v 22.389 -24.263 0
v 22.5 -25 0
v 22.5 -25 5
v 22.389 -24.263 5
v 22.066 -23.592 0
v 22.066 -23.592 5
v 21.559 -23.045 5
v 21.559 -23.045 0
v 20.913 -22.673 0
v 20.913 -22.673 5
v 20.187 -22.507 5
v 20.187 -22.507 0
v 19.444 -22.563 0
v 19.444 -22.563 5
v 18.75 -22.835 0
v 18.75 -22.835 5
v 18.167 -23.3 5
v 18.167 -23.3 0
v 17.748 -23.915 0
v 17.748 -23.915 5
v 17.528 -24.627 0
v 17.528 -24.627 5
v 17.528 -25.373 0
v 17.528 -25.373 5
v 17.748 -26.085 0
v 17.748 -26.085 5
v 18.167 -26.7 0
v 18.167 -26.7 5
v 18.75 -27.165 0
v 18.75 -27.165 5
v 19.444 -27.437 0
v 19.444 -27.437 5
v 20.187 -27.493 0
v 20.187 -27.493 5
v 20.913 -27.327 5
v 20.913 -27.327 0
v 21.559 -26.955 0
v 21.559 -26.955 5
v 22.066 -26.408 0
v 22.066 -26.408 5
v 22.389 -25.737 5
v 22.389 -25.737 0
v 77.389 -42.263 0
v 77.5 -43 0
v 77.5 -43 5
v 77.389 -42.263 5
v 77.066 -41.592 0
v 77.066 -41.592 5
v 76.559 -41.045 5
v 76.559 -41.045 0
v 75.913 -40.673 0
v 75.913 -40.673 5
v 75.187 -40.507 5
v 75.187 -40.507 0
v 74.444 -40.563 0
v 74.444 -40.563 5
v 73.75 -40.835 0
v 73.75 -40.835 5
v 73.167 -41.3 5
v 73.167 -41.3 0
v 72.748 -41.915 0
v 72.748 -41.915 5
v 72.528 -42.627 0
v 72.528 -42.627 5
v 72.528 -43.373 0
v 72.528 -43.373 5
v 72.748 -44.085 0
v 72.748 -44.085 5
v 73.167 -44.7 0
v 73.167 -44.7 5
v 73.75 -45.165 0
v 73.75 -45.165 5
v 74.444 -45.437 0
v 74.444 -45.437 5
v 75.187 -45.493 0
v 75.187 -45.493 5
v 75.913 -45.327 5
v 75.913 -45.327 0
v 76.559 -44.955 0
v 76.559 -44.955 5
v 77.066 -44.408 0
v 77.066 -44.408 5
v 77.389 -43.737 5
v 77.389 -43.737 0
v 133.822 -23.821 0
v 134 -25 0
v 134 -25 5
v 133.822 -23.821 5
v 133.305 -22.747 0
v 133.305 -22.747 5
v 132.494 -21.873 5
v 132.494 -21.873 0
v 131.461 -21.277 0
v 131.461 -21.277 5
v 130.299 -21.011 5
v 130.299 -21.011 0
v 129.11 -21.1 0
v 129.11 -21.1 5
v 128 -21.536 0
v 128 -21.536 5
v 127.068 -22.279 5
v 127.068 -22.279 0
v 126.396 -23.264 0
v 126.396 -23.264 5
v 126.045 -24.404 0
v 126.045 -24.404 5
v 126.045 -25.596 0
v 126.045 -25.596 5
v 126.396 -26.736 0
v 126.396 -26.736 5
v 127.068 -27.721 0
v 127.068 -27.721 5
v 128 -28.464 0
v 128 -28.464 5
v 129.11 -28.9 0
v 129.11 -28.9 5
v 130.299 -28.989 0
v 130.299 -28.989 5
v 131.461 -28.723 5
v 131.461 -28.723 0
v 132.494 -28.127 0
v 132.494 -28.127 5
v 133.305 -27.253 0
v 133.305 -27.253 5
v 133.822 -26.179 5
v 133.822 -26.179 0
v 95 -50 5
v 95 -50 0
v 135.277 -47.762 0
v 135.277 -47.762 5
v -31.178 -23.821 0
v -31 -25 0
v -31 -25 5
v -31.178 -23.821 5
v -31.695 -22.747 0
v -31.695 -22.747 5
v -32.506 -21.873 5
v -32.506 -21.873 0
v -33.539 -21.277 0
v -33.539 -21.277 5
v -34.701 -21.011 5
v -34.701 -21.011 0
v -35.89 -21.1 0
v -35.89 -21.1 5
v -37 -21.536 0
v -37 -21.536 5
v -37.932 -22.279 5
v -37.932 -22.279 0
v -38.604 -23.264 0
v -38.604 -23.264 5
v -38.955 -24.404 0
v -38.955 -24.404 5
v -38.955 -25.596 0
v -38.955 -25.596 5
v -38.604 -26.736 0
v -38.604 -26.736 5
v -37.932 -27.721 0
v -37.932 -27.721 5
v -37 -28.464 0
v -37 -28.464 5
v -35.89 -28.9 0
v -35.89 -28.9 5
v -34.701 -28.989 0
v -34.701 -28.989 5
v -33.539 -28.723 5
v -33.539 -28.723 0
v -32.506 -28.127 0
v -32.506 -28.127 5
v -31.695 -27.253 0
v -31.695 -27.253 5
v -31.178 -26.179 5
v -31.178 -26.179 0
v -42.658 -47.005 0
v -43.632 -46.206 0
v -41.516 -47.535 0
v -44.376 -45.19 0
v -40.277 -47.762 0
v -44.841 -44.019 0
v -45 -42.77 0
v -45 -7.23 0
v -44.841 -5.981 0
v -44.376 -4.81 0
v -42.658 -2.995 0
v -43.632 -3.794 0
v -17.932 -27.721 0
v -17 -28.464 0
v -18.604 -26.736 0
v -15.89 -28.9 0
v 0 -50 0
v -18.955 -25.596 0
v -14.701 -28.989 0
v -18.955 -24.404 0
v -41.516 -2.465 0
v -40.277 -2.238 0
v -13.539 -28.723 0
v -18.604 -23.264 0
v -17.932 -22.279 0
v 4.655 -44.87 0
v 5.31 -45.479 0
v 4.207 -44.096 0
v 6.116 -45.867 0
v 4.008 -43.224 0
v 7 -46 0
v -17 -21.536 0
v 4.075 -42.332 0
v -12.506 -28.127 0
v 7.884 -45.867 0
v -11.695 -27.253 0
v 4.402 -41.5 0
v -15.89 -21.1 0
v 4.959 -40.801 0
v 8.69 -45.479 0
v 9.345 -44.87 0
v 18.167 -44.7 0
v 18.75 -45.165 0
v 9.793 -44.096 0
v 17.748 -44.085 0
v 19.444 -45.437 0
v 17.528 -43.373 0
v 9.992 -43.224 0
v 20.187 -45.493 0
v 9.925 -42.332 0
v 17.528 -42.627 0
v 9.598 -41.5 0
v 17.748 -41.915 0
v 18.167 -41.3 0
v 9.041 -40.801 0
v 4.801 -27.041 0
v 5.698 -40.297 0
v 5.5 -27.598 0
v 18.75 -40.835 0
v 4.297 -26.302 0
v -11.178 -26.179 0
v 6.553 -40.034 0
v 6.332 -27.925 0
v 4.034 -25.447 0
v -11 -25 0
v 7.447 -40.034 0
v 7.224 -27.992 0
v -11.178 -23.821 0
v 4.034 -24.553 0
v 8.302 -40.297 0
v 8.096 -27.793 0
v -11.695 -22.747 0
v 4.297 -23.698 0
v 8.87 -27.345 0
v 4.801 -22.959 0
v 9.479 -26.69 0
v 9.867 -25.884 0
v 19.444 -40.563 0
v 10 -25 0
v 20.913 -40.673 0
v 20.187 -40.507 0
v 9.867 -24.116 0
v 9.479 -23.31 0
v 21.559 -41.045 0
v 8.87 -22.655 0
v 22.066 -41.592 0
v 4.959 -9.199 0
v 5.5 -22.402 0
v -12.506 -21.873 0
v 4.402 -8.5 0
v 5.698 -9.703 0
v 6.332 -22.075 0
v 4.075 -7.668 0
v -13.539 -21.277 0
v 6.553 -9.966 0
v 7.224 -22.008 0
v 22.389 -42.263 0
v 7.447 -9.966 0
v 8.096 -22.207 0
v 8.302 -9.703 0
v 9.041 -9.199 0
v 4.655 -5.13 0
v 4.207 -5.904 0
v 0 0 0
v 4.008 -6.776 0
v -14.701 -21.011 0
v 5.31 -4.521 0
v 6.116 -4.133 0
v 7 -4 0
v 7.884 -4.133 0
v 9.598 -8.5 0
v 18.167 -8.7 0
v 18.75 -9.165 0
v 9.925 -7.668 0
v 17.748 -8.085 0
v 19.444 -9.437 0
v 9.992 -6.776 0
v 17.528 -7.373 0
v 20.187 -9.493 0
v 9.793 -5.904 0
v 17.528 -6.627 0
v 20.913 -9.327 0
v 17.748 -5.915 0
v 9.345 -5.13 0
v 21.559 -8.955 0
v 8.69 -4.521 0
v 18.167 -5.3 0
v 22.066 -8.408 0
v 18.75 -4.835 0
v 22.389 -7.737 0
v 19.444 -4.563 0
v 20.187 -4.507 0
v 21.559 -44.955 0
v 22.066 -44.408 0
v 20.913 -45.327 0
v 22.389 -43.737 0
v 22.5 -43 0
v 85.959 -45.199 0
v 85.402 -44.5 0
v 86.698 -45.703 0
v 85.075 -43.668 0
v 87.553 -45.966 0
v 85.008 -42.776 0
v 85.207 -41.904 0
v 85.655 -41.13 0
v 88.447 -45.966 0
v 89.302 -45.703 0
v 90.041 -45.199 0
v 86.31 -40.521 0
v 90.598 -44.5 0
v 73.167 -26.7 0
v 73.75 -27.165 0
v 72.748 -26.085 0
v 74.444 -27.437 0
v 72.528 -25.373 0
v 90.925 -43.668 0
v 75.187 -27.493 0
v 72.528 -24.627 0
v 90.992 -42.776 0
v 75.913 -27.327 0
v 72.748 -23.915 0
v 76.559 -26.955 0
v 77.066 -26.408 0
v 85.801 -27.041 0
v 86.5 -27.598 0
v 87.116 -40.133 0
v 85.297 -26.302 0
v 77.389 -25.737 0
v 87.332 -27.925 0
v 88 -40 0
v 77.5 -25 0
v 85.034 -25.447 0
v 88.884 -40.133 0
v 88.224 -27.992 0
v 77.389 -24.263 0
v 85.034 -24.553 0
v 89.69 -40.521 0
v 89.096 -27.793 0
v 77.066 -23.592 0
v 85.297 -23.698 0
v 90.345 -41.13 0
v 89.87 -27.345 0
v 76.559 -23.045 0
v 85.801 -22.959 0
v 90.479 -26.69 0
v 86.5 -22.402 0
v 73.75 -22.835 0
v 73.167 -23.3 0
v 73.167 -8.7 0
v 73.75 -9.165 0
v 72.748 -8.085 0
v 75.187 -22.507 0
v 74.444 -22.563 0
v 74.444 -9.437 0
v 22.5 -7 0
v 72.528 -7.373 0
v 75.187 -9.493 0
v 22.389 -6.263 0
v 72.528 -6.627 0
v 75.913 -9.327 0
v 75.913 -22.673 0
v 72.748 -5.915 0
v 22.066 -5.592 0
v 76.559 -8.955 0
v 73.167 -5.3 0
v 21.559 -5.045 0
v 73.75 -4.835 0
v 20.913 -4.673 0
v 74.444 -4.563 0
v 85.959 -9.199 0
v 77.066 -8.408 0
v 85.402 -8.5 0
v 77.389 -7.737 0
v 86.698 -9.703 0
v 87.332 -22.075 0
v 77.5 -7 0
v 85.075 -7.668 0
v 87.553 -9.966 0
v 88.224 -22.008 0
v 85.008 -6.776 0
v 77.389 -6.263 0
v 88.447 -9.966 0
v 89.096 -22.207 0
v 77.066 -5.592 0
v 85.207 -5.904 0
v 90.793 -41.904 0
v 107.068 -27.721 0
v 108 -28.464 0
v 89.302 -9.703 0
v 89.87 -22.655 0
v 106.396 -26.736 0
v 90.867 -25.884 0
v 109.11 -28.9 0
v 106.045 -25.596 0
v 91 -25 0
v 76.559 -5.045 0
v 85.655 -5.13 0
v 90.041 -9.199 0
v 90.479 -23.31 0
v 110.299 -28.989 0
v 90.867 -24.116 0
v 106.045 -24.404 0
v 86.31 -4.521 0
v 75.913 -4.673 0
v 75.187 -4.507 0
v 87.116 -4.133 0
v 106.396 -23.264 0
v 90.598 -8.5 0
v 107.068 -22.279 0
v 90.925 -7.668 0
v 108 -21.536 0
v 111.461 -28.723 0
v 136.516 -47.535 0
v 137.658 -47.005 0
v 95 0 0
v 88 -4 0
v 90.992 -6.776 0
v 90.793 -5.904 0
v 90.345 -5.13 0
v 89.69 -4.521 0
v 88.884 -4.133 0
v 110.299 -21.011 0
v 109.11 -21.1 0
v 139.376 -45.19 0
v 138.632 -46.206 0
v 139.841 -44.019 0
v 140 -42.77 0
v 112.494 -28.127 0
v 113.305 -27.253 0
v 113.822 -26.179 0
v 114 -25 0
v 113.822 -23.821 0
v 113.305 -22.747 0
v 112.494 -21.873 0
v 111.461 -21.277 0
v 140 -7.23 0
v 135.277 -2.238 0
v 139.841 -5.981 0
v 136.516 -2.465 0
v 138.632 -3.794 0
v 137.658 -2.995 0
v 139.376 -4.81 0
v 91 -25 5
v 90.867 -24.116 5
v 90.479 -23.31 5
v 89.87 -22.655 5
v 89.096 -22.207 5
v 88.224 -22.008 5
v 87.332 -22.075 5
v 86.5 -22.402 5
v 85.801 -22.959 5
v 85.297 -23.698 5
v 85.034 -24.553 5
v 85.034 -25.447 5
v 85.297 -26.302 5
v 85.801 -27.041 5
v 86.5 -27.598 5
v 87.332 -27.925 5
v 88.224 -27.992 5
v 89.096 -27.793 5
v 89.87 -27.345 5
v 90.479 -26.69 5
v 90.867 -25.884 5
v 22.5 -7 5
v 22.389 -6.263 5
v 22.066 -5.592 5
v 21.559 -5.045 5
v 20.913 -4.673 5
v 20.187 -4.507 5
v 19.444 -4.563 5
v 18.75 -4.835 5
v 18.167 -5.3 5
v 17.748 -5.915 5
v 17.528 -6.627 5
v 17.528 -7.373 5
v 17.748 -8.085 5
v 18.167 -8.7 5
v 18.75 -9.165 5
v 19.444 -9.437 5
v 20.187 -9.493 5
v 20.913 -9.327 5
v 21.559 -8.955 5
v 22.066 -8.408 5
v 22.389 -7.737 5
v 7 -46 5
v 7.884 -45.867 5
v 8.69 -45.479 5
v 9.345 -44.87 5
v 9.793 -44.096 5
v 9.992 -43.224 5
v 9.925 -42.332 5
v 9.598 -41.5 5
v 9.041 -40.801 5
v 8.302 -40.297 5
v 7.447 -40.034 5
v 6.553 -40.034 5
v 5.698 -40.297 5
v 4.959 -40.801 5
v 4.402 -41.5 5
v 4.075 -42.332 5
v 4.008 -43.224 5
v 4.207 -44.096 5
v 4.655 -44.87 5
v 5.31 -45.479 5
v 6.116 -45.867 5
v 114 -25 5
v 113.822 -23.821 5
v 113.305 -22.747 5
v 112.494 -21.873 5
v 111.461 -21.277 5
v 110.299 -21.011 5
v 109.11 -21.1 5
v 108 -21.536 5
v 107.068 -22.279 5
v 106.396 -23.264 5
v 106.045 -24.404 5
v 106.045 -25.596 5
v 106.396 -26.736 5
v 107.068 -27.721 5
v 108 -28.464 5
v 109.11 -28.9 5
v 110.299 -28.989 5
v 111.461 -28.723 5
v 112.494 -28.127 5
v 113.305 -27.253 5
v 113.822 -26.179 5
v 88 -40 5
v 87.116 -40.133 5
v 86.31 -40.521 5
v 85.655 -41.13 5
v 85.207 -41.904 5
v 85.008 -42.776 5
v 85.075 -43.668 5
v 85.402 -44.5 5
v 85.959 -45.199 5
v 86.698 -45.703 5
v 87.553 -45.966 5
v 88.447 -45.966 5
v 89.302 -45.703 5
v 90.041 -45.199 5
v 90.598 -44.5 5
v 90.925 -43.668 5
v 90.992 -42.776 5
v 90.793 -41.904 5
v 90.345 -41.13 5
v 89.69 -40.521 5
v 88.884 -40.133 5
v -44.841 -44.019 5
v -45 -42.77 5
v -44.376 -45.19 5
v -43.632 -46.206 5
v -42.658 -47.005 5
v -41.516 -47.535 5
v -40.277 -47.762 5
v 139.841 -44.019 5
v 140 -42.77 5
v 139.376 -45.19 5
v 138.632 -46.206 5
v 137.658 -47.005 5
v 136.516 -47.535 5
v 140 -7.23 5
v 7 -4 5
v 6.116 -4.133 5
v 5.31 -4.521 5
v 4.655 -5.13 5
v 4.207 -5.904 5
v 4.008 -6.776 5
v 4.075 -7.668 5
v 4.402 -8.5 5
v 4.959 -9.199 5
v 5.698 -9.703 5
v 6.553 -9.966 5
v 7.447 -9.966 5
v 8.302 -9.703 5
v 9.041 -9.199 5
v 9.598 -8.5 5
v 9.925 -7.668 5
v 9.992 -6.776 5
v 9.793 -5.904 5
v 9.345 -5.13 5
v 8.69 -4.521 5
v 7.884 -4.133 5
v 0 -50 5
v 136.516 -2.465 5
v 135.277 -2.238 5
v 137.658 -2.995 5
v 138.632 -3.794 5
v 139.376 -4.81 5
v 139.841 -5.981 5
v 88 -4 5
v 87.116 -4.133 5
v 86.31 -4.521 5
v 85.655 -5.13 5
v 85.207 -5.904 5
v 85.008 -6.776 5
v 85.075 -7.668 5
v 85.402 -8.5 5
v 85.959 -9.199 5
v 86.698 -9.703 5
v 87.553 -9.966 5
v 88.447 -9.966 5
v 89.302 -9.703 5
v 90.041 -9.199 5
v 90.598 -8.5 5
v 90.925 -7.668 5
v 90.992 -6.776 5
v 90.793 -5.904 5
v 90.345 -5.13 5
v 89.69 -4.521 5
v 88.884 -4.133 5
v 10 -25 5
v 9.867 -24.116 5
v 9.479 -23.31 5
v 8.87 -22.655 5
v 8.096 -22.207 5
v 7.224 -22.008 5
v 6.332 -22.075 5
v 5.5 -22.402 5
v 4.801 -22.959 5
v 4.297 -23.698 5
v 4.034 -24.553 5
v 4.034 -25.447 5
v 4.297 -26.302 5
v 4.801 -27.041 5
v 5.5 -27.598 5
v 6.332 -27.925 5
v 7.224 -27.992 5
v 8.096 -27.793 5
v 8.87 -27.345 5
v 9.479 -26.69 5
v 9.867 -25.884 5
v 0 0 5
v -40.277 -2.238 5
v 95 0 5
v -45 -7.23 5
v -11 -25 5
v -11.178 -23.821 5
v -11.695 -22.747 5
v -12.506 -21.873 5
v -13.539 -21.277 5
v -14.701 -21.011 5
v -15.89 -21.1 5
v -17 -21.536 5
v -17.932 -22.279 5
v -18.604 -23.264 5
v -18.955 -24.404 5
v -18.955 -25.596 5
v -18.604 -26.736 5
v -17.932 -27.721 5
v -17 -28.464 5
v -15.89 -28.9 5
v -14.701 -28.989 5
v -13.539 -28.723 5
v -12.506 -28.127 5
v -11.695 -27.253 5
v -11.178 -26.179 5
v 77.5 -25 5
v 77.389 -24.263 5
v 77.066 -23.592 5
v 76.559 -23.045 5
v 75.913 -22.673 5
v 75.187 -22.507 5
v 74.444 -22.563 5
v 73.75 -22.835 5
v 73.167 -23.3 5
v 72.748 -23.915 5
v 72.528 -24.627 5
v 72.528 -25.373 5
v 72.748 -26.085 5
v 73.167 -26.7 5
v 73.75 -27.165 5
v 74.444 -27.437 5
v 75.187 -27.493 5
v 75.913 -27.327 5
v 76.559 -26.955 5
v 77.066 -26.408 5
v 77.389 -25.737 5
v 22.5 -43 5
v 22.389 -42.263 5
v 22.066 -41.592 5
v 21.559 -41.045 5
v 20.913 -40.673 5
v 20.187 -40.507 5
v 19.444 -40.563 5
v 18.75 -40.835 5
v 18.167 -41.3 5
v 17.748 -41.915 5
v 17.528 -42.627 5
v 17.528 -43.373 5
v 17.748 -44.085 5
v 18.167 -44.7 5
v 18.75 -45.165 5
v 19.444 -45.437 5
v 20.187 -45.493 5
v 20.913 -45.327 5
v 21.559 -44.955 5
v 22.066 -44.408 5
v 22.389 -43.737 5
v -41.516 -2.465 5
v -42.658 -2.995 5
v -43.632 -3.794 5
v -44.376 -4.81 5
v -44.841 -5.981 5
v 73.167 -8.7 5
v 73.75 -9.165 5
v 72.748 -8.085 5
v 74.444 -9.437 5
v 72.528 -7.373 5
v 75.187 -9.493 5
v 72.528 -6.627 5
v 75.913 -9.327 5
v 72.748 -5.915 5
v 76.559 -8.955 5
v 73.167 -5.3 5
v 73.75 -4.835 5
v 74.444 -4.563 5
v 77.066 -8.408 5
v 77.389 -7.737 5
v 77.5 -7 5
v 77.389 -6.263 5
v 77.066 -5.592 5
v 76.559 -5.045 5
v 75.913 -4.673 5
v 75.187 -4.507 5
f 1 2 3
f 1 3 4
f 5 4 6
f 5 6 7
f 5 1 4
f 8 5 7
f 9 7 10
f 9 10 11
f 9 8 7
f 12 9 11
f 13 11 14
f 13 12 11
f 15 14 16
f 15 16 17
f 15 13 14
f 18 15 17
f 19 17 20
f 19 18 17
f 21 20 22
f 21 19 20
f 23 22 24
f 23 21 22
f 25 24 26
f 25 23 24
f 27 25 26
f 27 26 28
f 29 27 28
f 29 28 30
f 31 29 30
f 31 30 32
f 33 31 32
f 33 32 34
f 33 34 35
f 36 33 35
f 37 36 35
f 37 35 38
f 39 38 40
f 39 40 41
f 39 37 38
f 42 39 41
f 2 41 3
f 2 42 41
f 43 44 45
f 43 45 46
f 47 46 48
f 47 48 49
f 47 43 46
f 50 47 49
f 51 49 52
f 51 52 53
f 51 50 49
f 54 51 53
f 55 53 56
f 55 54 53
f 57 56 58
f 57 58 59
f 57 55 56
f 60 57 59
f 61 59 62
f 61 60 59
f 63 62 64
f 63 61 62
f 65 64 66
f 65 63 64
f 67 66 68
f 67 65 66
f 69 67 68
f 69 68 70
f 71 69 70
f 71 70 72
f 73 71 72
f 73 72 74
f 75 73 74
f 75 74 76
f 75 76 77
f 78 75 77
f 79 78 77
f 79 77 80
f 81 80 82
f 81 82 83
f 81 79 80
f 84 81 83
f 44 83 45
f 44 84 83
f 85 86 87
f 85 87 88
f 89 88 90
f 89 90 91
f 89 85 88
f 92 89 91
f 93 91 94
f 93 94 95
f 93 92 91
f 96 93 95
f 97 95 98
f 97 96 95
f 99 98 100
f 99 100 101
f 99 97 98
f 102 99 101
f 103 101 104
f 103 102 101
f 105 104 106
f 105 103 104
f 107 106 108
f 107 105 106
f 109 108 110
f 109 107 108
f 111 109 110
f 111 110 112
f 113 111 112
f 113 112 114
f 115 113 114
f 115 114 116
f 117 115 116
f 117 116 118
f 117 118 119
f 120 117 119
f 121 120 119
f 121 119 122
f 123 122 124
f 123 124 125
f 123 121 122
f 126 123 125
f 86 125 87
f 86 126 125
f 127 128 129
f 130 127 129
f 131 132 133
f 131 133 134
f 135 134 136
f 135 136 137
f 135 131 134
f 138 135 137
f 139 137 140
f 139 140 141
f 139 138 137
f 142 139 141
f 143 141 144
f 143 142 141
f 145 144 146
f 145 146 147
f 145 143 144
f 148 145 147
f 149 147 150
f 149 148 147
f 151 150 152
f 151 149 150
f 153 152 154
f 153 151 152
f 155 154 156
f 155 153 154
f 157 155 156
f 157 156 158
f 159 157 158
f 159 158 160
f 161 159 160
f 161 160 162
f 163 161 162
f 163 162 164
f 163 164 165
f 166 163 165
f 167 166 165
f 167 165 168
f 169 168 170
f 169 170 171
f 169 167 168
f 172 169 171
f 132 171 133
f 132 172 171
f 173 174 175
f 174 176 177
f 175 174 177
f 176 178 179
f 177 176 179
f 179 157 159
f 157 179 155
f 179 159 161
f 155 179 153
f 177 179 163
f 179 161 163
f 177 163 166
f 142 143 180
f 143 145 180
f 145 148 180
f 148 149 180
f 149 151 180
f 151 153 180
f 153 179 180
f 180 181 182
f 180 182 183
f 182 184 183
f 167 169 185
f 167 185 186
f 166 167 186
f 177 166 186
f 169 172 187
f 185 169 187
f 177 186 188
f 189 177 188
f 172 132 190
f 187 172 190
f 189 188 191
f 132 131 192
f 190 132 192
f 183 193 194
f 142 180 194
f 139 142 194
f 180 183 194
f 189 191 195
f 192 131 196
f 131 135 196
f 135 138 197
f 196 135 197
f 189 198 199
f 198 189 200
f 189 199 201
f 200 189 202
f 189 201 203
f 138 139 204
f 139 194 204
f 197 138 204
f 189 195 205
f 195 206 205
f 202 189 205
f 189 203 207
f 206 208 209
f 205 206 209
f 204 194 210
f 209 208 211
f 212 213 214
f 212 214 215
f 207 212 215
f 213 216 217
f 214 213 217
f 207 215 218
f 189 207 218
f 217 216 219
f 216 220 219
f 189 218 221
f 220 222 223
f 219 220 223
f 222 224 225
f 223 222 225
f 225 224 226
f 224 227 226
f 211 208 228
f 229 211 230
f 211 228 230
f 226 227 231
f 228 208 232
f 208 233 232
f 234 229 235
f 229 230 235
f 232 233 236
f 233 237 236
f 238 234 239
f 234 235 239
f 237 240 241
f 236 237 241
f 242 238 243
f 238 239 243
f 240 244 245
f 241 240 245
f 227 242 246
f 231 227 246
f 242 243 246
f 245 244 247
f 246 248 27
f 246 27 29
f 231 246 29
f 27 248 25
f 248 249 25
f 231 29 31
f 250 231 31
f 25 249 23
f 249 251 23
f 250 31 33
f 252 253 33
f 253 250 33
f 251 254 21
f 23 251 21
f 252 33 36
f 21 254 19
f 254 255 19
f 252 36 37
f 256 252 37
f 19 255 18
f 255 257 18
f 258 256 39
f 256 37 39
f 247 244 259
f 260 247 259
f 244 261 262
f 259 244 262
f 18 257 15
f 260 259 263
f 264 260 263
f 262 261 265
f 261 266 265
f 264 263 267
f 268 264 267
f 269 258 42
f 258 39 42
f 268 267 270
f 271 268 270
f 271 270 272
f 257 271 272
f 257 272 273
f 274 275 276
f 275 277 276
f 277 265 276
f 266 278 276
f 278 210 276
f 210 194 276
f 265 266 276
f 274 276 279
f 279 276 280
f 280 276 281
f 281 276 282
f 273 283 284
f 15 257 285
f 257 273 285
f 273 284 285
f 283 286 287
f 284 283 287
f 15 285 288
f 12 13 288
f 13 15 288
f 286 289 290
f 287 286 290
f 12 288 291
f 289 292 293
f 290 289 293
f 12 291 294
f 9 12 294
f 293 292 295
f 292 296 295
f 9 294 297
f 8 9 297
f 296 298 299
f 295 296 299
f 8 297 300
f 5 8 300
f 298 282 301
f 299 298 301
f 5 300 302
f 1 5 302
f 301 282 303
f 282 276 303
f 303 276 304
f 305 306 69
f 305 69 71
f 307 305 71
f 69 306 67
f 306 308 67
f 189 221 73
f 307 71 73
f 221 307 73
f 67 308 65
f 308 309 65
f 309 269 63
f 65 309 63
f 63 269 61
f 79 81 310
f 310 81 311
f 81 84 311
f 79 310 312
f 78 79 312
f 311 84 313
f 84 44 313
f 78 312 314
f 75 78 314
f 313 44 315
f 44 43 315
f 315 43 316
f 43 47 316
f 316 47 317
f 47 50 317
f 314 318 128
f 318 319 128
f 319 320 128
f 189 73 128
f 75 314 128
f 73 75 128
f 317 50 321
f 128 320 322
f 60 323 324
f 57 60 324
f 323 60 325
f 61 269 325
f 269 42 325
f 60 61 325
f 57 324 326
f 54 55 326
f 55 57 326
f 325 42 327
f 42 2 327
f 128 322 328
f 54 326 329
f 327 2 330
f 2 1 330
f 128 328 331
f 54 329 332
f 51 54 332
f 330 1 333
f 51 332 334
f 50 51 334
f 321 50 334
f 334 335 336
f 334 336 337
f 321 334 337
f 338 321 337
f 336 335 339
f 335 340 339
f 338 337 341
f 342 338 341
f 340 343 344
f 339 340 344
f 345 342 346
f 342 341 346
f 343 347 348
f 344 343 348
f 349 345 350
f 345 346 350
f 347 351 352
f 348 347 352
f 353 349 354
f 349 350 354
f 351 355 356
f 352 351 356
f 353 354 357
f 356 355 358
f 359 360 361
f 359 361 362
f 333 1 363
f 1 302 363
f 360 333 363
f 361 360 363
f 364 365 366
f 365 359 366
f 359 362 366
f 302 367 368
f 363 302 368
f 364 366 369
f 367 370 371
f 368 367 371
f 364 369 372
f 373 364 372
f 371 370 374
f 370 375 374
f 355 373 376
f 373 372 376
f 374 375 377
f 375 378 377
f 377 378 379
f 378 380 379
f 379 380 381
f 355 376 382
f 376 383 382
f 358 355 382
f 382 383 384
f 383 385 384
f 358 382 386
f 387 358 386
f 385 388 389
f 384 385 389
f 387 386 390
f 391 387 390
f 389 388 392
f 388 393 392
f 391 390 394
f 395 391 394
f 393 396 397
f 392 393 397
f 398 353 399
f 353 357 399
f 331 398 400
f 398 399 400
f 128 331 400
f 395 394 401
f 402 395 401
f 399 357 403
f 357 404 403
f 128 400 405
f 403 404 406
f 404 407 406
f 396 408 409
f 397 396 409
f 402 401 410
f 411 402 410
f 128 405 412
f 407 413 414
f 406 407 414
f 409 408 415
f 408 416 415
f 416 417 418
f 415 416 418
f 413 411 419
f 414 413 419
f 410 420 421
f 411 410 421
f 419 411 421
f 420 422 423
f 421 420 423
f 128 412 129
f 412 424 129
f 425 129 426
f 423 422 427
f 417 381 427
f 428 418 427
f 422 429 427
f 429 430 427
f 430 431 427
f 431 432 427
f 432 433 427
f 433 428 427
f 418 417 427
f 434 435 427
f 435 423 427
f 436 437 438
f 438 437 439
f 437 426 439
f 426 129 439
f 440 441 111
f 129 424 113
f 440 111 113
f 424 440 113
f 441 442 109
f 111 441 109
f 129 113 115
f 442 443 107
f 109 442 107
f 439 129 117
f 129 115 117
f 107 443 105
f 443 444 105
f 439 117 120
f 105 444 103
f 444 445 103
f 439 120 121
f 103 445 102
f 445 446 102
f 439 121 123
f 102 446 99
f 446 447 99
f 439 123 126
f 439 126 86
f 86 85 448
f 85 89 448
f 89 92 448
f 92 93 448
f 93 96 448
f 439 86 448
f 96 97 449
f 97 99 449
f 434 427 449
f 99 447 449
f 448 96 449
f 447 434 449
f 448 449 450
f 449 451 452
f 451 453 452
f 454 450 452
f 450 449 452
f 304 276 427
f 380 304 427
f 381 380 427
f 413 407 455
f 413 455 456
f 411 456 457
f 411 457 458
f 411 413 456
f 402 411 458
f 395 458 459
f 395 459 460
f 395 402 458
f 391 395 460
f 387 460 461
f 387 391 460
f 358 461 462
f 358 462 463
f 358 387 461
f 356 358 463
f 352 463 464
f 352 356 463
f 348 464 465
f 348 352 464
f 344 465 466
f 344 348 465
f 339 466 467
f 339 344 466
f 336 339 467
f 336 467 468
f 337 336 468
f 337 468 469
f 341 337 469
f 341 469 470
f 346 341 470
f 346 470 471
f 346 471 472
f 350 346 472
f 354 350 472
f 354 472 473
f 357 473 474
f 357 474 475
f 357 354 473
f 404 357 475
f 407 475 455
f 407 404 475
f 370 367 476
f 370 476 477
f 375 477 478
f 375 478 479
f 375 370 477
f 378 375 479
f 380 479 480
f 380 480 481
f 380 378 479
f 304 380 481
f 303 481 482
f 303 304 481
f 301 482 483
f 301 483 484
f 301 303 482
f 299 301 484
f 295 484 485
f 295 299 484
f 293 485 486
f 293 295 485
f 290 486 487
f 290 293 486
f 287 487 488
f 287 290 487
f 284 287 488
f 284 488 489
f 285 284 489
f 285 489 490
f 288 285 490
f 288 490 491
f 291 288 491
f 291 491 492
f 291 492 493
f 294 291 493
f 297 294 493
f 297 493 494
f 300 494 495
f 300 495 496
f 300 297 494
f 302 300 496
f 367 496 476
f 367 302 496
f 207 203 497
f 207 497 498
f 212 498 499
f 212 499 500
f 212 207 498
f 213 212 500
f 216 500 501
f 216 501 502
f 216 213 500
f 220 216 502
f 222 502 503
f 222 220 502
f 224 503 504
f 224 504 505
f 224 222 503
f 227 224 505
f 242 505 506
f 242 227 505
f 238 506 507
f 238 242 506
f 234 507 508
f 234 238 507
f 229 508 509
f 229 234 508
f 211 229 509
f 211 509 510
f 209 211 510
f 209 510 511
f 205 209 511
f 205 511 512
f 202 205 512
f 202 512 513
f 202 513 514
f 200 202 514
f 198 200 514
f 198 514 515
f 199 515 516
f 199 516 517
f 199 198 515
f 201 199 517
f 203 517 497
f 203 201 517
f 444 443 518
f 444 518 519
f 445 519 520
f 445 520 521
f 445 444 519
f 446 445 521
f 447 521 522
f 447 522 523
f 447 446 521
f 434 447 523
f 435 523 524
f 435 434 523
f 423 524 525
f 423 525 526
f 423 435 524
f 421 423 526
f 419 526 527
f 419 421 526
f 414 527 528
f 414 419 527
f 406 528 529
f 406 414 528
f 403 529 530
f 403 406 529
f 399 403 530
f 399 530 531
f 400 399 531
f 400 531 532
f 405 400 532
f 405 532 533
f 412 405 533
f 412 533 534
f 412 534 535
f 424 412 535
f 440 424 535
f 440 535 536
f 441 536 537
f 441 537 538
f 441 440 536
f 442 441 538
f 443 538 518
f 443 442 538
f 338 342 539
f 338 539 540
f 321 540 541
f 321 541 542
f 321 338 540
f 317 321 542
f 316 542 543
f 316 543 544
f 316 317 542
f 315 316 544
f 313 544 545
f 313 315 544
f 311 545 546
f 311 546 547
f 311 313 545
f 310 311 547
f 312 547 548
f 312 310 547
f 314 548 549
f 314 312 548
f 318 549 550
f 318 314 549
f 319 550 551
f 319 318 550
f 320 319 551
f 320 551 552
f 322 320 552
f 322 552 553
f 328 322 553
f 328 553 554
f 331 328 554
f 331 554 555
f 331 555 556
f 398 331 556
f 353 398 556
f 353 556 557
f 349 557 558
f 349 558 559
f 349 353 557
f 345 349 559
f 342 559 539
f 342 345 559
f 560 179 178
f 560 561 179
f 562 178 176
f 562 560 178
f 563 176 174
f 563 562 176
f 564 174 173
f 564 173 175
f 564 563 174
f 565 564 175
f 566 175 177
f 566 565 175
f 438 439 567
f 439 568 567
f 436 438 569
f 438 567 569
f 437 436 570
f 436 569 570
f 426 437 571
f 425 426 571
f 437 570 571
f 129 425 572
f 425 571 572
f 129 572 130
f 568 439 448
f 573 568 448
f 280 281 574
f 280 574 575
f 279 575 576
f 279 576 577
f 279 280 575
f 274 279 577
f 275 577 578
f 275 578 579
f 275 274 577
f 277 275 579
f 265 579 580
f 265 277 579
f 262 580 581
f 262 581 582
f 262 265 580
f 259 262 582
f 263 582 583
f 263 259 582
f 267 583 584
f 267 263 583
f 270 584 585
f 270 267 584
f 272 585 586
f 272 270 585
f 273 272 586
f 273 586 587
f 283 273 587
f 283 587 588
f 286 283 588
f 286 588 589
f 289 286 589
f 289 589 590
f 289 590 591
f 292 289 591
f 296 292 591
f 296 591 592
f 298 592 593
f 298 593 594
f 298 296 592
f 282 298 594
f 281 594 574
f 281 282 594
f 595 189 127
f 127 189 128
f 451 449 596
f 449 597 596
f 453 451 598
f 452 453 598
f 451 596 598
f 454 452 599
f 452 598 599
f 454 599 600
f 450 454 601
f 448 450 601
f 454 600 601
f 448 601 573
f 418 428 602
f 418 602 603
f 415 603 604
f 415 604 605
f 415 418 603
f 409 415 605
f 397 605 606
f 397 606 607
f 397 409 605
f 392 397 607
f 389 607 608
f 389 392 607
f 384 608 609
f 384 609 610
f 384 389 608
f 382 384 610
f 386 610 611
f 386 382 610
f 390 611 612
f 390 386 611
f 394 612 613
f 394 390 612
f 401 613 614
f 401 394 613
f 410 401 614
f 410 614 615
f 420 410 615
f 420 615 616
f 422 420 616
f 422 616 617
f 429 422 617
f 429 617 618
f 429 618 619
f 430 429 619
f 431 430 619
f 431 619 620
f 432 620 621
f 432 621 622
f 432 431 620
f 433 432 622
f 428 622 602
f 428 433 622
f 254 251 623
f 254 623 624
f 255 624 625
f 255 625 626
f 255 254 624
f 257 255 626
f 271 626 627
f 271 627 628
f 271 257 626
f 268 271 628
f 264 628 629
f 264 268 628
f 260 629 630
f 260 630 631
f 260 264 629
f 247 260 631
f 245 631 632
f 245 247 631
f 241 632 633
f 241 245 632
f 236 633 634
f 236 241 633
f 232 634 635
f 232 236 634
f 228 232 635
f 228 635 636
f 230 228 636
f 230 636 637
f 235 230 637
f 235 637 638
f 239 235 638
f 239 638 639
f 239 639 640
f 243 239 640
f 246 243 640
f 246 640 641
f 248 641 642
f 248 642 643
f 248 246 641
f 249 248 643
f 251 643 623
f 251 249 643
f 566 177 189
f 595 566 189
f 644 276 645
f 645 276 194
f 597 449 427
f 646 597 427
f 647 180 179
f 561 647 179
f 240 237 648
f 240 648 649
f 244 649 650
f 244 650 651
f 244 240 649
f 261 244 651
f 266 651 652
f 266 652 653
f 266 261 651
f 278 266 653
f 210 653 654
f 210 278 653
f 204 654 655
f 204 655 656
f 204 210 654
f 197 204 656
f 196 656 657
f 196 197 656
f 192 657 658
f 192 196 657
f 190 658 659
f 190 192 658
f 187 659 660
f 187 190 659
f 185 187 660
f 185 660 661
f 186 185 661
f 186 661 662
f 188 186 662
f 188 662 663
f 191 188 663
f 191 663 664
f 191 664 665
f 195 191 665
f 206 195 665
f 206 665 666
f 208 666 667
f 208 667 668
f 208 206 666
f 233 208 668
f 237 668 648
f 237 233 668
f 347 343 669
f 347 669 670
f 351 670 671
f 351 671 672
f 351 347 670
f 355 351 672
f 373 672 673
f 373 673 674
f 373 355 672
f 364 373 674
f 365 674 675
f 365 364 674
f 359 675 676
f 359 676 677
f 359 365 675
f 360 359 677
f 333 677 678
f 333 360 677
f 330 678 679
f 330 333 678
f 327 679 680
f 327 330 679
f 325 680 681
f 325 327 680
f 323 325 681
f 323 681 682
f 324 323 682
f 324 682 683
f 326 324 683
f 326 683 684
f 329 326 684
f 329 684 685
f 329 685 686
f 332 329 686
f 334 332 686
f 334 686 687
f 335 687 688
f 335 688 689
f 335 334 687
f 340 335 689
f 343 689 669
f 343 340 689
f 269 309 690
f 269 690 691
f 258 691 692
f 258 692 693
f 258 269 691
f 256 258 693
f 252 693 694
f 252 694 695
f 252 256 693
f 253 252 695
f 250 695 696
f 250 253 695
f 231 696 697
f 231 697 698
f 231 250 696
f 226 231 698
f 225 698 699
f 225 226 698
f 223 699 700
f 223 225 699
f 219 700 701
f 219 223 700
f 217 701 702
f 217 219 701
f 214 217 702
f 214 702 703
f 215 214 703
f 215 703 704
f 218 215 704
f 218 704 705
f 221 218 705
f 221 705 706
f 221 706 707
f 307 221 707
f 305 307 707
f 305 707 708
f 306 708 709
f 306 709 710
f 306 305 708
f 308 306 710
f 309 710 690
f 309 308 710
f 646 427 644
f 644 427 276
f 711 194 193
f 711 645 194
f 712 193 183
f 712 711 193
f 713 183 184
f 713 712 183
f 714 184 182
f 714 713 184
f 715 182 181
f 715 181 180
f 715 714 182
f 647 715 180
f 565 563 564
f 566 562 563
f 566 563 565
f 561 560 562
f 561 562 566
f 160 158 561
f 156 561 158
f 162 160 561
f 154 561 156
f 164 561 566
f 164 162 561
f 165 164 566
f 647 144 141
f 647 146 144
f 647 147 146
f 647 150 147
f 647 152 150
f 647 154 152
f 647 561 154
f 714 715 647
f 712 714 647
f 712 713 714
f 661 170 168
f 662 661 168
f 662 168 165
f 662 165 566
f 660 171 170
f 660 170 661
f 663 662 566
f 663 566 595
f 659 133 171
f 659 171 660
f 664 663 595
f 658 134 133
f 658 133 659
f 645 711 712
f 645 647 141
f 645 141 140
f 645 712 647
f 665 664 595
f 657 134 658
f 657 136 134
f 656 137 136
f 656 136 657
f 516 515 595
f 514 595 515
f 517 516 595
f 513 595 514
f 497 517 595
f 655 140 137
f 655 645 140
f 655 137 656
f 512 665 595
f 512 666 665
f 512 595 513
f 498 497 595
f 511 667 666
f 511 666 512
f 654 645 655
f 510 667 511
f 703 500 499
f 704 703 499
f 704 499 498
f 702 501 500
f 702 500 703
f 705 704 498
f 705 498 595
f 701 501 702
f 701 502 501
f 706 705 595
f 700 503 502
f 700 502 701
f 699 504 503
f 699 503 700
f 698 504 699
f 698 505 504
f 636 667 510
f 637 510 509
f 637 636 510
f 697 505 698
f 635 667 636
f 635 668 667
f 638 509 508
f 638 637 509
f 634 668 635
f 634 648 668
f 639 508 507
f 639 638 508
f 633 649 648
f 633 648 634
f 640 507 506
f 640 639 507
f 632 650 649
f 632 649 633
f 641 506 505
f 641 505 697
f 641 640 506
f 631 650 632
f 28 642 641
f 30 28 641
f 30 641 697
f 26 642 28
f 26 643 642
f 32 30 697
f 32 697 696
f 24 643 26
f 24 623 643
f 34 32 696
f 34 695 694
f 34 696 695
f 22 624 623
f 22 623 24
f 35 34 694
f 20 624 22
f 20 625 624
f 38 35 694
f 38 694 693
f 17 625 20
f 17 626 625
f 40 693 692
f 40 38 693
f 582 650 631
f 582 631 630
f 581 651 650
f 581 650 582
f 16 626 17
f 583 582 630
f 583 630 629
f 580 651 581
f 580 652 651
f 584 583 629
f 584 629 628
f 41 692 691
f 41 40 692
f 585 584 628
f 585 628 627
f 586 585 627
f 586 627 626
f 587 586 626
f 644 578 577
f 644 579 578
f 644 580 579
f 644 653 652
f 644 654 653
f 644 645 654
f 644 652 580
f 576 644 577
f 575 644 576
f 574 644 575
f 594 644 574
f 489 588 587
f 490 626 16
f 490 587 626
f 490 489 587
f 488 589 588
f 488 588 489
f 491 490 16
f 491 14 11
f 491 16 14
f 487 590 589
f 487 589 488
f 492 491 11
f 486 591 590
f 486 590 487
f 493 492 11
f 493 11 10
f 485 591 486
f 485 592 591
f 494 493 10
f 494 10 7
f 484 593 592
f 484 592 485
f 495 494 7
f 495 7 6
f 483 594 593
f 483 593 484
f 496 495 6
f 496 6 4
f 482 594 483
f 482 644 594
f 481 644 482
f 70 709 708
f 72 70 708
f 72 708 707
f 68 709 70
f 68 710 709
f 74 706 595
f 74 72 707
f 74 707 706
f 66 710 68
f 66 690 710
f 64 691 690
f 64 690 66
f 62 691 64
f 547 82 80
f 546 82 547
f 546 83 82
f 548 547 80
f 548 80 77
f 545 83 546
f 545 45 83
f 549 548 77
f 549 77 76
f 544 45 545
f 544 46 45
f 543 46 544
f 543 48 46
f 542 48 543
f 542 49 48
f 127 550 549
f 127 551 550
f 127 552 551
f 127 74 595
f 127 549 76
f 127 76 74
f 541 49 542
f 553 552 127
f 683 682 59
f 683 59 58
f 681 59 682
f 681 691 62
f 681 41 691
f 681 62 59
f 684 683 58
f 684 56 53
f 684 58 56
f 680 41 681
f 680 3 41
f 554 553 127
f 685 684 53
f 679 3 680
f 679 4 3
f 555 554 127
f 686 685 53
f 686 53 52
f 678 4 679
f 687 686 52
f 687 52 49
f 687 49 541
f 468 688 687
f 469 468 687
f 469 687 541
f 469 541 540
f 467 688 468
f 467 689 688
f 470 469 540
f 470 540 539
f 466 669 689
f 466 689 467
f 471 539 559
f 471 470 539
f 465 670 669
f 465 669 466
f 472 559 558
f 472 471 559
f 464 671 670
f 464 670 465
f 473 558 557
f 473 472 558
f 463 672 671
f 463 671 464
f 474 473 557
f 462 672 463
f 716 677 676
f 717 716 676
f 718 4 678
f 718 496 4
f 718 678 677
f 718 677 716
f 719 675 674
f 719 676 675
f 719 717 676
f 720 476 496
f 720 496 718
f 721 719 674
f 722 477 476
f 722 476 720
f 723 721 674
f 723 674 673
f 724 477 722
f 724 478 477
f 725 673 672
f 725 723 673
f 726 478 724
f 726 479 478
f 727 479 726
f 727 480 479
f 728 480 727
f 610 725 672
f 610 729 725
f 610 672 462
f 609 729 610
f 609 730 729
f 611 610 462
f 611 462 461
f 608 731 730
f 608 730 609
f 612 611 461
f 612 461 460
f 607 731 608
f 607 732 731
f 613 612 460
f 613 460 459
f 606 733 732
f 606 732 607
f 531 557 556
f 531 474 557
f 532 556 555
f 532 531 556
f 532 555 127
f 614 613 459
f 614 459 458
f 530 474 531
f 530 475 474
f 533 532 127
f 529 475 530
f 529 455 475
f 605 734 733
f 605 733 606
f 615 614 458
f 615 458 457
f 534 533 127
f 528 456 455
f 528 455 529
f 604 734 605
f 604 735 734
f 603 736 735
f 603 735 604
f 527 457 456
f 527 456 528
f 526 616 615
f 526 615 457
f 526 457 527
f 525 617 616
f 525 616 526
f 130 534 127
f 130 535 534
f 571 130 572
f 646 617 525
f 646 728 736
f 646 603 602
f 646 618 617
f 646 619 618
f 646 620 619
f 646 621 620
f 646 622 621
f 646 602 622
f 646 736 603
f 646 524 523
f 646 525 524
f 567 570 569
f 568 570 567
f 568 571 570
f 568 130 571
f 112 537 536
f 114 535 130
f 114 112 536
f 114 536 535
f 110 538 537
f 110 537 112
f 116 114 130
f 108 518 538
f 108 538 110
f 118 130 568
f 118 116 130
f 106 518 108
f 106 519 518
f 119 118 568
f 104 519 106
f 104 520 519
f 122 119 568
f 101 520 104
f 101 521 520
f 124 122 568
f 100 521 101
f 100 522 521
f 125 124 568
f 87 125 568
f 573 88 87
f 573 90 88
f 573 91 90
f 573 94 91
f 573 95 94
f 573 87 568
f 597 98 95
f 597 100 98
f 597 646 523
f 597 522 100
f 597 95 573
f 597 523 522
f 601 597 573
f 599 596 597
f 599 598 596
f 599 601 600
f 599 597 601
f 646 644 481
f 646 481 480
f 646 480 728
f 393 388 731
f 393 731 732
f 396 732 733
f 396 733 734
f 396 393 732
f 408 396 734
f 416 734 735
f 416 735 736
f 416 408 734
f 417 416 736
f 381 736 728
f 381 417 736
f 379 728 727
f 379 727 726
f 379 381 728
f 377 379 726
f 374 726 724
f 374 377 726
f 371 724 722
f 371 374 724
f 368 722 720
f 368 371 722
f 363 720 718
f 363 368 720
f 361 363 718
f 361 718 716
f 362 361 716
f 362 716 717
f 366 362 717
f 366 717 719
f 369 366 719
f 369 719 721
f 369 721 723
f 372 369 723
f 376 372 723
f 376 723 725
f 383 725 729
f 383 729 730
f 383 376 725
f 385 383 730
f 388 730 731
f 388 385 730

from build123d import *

# Parameters (mm, degrees)
SKETCH1_R           = 4
SKETCH1_R_2         = 2.5
SKETCH1_R_3         = 3
BOSS_EXTRUDE1_DEPTH = 5
FILLET1_R           = 5


with BuildPart() as part:
    # Sketch1 → Boss-Extrude1 (new body)
    with BuildSketch(Plane.XY):
        Polygon((95, 0), (0, 0), (-45, -2.5), (-45, -47.5), (0, -50), (95, -50), (140, -47.5), (140, -2.5), align=None)
        with Locations((-35, -25)):
            Circle(SKETCH1_R, mode=Mode.SUBTRACT)
        with Locations((-15, -25)):
            Circle(SKETCH1_R, mode=Mode.SUBTRACT)
        with Locations((75, -43)):
            Circle(SKETCH1_R_2, mode=Mode.SUBTRACT)
        with Locations((75, -7)):
            Circle(SKETCH1_R_2, mode=Mode.SUBTRACT)
        with Locations((110, -25)):
            Circle(SKETCH1_R, mode=Mode.SUBTRACT)
        with Locations((130, -25)):
            Circle(SKETCH1_R, mode=Mode.SUBTRACT)
        with Locations((20, -25)):
            Circle(SKETCH1_R_2, mode=Mode.SUBTRACT)
        with Locations((75, -25)):
            Circle(SKETCH1_R_2, mode=Mode.SUBTRACT)
        with Locations((7, -25)):
            Circle(SKETCH1_R_3, mode=Mode.SUBTRACT)
        with Locations((88, -25)):
            Circle(SKETCH1_R_3, mode=Mode.SUBTRACT)
        with Locations((20, -7)):
            Circle(SKETCH1_R_2, mode=Mode.SUBTRACT)
        with Locations((20, -43)):
            Circle(SKETCH1_R_2, mode=Mode.SUBTRACT)
        with BuildLine():
            ThreePointArc((7, -40), (4, -43), (7, -46))
            ThreePointArc((7, -46), (10, -43), (7, -40))
        make_face(mode=Mode.SUBTRACT)
        with BuildLine():
            ThreePointArc((88, -46), (91, -43), (88, -40))
            ThreePointArc((88, -40), (85, -43), (88, -46))
        make_face(mode=Mode.SUBTRACT)
        with BuildLine():
            ThreePointArc((88, -10), (91, -7), (88, -4))
            ThreePointArc((88, -4), (85, -7), (88, -10))
        make_face(mode=Mode.SUBTRACT)
        with BuildLine():
            ThreePointArc((7, -10), (10, -7), (7, -4))
            ThreePointArc((7, -4), (4, -7), (7, -10))
        make_face(mode=Mode.SUBTRACT)
    extrude(amount=BOSS_EXTRUDE1_DEPTH)

    # Fillet1
    fillet1_edges = [part.edges().sort_by_distance(p)[0] for p in [
        (140, -2.5, 2.5),
        (140, -47.5, 2.5),
        (-45, -47.5, 2.5),
        (-45, -2.5, 2.5),
    ]]
    fillet(fillet1_edges, radius=FILLET1_R)


solid = part.part
